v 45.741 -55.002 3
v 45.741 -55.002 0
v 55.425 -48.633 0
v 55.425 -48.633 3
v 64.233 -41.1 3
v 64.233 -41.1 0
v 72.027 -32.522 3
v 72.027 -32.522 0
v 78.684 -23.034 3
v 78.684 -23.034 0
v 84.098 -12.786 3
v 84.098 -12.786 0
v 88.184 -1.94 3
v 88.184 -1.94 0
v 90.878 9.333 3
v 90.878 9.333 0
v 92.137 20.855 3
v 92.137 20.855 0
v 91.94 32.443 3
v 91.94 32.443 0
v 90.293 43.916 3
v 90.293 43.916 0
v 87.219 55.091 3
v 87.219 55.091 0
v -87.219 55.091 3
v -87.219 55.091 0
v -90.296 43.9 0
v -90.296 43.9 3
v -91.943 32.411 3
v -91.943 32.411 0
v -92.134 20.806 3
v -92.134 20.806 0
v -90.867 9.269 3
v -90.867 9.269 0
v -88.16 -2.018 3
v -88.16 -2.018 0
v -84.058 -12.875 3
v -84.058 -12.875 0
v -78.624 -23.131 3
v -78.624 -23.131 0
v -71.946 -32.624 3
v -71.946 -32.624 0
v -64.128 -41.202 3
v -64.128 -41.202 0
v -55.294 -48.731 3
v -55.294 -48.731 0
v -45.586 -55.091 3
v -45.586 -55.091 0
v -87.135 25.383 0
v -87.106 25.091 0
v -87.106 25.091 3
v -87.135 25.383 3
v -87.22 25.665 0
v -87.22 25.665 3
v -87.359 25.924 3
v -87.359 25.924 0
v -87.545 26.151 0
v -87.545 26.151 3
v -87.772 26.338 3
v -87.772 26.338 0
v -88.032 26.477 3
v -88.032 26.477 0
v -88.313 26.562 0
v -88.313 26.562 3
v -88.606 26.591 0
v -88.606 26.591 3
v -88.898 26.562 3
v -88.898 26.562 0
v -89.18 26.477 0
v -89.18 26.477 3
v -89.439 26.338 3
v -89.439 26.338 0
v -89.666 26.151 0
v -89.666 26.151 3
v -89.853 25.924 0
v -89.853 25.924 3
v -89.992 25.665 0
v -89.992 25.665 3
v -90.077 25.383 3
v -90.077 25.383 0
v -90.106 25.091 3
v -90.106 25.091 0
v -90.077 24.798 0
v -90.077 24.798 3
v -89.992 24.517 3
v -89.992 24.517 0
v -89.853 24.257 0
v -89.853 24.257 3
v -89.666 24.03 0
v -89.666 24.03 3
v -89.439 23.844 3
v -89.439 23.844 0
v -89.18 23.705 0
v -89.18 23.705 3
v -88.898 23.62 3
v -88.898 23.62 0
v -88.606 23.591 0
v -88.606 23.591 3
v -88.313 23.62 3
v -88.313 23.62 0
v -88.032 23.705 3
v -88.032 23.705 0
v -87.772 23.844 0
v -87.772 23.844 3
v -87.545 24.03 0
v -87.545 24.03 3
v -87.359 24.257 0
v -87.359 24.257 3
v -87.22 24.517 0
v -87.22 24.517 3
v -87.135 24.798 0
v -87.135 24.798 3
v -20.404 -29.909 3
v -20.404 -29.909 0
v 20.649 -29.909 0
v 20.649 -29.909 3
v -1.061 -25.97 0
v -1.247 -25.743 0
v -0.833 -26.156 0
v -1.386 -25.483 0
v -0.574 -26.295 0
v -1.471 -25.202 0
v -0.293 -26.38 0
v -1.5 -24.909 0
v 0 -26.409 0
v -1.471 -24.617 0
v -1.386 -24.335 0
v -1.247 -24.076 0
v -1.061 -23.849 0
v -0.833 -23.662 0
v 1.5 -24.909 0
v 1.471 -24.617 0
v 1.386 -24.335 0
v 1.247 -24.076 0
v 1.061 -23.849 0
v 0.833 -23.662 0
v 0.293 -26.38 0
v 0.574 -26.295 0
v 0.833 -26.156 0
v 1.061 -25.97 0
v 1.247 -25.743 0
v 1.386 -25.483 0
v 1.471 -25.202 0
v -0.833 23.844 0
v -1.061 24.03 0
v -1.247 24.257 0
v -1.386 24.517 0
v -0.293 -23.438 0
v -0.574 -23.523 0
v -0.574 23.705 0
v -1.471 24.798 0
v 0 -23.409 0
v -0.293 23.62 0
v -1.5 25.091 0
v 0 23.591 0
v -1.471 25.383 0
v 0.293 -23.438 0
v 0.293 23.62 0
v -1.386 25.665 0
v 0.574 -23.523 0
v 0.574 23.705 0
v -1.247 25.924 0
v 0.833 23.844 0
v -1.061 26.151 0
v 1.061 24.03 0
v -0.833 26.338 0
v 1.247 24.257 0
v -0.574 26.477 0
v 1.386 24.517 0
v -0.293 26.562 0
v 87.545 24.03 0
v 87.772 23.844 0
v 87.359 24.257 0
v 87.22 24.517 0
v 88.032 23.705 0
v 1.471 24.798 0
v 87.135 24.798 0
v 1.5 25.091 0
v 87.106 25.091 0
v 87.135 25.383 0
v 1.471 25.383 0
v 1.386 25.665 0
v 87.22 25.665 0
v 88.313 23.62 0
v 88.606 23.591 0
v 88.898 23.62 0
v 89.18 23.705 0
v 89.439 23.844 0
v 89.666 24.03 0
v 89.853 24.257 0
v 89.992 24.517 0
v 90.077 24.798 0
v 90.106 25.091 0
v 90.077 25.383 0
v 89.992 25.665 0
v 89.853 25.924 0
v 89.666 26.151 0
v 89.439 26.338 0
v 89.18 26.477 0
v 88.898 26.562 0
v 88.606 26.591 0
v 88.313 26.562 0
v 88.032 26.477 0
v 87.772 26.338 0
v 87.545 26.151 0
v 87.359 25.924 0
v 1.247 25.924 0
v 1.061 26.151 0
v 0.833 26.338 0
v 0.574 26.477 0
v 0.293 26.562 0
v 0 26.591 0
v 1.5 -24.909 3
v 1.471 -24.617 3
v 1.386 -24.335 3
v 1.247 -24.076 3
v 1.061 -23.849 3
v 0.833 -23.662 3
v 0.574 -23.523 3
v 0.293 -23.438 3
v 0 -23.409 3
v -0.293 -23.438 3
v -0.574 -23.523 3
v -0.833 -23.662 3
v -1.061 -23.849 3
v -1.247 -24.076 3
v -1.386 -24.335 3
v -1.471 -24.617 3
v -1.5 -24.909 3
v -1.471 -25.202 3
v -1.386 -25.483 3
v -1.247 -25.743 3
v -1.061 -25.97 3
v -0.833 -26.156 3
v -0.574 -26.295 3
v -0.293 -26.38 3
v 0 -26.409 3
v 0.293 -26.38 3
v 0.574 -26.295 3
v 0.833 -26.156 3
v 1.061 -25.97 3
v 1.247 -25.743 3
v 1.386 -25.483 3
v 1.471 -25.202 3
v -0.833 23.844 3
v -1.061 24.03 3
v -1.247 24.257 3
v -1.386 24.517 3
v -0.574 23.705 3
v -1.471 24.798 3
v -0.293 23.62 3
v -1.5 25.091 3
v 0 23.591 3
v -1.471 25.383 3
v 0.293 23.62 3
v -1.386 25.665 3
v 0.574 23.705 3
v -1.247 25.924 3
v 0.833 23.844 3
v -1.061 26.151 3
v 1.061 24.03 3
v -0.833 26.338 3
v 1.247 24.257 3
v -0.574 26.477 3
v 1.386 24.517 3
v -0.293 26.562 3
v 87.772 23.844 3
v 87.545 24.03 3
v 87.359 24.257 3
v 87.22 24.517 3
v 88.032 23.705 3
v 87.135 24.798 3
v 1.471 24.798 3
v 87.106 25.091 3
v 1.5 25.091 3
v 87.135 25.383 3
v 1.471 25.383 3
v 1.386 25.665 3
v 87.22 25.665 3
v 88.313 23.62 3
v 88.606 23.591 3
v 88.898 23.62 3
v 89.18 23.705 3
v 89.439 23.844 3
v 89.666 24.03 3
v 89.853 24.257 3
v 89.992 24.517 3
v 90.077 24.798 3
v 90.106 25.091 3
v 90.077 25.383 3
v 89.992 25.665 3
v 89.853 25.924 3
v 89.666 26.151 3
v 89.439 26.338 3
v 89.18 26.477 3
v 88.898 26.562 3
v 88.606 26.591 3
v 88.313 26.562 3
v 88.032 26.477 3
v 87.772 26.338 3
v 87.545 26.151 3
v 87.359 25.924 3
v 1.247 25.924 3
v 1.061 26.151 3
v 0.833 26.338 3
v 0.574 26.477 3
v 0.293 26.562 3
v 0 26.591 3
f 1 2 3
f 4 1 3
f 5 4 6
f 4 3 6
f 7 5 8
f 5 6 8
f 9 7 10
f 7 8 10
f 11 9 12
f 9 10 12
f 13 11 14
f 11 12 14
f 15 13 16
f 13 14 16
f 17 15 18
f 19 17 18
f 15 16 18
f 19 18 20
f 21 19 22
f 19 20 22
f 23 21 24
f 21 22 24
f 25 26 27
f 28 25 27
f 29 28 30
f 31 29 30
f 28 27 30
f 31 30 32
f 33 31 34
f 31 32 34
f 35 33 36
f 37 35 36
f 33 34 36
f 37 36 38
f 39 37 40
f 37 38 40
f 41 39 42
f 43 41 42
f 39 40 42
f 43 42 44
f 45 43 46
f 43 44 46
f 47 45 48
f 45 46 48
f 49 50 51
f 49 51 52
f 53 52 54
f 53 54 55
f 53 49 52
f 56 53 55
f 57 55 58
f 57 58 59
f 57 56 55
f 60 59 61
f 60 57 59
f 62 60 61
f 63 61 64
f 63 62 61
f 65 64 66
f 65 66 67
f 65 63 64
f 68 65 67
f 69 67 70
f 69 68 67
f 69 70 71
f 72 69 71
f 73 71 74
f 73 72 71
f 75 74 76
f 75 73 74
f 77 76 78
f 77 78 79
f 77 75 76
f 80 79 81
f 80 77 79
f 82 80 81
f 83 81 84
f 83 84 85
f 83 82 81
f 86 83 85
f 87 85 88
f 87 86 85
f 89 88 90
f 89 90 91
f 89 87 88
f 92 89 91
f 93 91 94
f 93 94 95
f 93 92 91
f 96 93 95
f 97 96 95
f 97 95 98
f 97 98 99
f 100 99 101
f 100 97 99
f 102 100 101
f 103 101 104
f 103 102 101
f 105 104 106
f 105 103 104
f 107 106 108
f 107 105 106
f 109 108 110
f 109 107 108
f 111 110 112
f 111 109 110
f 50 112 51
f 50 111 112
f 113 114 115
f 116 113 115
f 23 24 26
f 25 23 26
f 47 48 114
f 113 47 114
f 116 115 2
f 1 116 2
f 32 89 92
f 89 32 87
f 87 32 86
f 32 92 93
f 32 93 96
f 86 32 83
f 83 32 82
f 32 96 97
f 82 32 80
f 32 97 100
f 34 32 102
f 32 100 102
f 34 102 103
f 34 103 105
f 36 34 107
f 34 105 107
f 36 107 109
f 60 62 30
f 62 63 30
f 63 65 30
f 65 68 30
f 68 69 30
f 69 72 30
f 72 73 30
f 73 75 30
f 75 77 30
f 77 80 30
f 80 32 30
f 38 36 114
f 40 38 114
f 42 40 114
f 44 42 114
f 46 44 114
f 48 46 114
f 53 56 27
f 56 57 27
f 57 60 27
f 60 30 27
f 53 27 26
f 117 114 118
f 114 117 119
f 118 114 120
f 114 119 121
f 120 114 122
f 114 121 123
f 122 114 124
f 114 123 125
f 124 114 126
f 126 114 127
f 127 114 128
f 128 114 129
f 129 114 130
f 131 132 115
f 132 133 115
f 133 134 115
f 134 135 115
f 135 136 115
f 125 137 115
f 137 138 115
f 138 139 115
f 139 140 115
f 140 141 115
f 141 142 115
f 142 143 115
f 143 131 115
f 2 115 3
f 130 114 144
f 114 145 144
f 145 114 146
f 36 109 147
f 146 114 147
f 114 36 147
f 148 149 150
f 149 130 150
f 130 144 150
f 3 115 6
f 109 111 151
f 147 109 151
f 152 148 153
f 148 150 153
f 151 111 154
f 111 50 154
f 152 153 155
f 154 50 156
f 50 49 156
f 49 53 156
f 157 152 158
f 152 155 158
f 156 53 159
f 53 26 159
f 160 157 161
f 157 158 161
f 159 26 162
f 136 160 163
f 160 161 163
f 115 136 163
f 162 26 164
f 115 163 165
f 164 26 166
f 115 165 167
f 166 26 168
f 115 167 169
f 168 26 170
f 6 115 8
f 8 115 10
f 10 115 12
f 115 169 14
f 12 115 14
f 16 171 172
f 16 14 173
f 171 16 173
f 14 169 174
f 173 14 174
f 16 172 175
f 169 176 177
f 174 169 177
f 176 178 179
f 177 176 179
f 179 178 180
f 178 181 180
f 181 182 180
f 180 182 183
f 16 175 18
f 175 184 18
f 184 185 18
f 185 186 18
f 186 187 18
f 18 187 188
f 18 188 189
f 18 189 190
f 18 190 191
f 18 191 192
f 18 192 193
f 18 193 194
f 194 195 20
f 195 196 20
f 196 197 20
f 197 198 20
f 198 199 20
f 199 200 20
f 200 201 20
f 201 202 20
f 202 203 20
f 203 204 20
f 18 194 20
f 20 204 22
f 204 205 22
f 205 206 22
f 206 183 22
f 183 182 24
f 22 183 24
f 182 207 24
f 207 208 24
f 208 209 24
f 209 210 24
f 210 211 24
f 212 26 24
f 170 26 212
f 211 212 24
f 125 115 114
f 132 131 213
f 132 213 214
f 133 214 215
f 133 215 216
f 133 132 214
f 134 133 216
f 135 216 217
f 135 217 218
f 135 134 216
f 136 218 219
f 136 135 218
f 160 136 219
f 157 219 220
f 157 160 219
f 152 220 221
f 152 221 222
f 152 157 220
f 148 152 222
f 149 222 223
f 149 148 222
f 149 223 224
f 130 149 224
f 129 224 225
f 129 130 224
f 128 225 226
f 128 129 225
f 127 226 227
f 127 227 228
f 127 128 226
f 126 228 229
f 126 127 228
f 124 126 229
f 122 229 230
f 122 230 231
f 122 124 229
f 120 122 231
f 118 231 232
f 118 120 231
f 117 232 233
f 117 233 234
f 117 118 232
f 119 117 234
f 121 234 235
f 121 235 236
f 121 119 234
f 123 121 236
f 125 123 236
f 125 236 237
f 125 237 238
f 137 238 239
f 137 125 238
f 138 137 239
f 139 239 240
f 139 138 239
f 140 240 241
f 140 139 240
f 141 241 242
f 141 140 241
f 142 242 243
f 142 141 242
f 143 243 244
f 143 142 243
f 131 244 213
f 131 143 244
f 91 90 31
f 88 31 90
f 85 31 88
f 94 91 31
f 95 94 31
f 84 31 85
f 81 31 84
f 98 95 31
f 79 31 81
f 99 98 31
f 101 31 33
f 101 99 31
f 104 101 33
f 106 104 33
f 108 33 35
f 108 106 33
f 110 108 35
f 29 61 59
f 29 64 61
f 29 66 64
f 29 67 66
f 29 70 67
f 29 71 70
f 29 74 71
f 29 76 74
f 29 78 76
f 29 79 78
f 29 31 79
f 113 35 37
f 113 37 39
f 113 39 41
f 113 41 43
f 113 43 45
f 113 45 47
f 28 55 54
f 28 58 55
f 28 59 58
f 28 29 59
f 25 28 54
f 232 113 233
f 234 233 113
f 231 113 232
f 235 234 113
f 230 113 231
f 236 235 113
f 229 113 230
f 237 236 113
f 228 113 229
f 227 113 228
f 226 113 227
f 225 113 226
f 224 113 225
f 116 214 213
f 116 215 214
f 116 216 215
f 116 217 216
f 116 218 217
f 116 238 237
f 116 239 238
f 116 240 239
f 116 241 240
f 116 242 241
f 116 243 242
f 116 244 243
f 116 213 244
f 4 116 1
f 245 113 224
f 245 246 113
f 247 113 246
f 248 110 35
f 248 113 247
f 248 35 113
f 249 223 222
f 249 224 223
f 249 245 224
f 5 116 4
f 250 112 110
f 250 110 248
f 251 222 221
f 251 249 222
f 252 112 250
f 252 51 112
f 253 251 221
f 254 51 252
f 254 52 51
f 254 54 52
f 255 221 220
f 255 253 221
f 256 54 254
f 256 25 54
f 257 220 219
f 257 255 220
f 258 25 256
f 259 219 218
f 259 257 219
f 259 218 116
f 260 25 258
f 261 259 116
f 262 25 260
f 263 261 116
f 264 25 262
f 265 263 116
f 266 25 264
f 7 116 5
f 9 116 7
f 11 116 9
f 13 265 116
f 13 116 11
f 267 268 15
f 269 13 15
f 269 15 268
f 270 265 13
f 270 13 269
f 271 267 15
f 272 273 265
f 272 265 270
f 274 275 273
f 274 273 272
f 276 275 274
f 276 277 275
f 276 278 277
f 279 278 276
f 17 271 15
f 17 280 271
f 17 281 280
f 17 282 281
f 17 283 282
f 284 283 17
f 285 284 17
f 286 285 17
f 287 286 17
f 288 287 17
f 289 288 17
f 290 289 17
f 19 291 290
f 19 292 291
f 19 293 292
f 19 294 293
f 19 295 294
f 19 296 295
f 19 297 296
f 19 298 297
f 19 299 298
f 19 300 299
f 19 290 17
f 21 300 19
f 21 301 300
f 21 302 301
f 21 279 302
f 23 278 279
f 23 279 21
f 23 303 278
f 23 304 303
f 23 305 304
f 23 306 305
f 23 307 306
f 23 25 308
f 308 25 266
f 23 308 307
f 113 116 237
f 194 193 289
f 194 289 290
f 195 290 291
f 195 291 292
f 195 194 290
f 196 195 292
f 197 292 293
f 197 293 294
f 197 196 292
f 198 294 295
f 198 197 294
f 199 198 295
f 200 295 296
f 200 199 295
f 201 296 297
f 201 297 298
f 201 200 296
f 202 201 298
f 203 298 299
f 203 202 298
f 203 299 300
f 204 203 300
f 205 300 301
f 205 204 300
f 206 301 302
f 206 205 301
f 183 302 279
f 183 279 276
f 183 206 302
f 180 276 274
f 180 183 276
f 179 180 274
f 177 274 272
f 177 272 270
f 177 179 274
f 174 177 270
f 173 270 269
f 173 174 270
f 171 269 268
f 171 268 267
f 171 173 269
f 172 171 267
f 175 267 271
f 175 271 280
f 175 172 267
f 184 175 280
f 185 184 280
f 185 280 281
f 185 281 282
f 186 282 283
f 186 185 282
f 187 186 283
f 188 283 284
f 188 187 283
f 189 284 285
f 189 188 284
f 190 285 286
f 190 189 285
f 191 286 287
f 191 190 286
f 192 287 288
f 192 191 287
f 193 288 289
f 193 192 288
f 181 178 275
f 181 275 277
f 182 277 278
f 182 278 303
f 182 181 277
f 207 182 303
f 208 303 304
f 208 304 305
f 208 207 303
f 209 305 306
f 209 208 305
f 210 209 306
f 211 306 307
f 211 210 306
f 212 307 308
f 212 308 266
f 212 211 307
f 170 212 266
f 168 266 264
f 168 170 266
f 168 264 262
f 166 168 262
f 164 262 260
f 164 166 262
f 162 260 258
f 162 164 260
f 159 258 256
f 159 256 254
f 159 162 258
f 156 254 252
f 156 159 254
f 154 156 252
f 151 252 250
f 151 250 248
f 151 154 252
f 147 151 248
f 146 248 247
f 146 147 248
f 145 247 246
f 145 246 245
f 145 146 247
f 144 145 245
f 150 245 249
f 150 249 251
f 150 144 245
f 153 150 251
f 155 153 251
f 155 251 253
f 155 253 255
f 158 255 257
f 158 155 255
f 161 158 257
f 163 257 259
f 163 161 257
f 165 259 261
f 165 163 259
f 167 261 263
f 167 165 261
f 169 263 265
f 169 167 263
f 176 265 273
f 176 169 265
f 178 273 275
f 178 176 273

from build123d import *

# Parameters (mm, degrees)
CROQUIS1_R              = 1.5
SALIENTE_EXTRUIR1_DEPTH = 3


with BuildPart() as part:
    # Croquis1 → Saliente-Extruir1 (new body)
    with BuildSketch(Plane.XY):
        with BuildLine():
            Line((87.218748359, 55.090741804), (-87.218748359, 55.090741804))
            ThreePointArc((-87.218748359, 55.090741804), (-86.279970689, -7.51104838), (-45.585521295, -55.090741804))
            Line((-45.585521295, -55.090741804), (-20.404037688, -29.909258196))
            Line((-20.404037688, -29.909258196), (20.648831544, -29.909258196))
            Line((20.648831544, -29.909258196), (45.741459084, -55.001885736))
            ThreePointArc((45.741459084, -55.001885736), (86.311649564, -7.427087381), (87.218748359, 55.090741804))
        make_face()
        with Locations((0, -24.909258196)):
            Circle(CROQUIS1_R, mode=Mode.SUBTRACT)
        with Locations((88.605744965, 25.090741804)):
            Circle(CROQUIS1_R, mode=Mode.SUBTRACT)
        with Locations((0, 25.090741804)):
            Circle(CROQUIS1_R, mode=Mode.SUBTRACT)
        with Locations((-88.605744965, 25.090741804)):
            Circle(CROQUIS1_R, mode=Mode.SUBTRACT)
    extrude(amount=SALIENTE_EXTRUIR1_DEPTH)


solid = part.part
